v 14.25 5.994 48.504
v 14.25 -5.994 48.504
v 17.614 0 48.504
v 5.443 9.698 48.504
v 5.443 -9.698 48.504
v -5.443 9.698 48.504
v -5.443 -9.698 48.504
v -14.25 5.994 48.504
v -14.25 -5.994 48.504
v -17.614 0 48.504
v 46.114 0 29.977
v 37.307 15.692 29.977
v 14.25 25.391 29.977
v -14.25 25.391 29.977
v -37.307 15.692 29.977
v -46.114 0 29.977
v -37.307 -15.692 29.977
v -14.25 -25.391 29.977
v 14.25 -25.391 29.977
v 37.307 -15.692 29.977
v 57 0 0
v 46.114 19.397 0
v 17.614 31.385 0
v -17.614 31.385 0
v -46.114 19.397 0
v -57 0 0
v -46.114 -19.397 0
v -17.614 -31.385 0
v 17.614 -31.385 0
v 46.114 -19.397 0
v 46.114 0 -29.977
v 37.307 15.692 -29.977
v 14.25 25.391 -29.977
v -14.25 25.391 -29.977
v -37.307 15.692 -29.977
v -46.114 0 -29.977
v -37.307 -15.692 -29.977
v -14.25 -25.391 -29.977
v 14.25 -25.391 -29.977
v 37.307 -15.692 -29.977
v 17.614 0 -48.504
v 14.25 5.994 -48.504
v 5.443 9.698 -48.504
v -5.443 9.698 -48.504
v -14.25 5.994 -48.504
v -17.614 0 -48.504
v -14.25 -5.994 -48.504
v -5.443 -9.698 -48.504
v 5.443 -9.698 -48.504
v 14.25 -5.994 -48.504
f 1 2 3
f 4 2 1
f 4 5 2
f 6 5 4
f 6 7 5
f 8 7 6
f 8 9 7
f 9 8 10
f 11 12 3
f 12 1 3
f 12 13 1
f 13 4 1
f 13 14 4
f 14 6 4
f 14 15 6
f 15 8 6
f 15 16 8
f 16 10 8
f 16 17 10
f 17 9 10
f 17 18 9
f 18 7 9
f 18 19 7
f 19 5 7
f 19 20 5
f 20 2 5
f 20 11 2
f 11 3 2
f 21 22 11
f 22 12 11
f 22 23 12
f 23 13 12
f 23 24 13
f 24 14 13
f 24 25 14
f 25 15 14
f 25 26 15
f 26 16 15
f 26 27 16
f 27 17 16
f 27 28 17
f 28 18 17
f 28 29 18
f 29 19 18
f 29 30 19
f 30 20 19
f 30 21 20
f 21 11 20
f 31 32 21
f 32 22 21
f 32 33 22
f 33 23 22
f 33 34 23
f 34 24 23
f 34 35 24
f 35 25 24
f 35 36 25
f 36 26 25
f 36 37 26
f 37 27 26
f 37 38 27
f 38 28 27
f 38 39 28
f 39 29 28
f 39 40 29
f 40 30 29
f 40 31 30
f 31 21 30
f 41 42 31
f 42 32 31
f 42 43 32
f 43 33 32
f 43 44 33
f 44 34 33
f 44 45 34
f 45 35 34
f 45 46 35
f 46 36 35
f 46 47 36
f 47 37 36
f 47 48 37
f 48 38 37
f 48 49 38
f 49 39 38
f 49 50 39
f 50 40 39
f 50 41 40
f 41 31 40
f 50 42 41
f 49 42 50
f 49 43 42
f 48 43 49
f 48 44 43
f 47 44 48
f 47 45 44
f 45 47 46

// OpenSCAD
// Generated by SolidPython 1.0.1 on 2020-07-29 00:46:54


scale(v = [19, 11, 17]) {
	sphere(r = 3);
}
/***********************************************
*********      SolidPython code:      **********
************************************************
 
# import packages: SolidPython
from solid import *
from solid.utils import *
from itertools import chain, combinations, permutations


class Resize:

    def __init__(self, scad_file):
        self.scad_file = scad_file
        #self.scad_file = import_scad(scad_file)
        # cone/cylinder param:
        self.r1 = 0
        self.r2 = 0
        self.h = 0
        # rectangular prism param:
        self.w = 0
        self.l = 0
        # ellipse param:
        self.r = 0

    # import OpenScad code (file name corresponds to shape)


    # classify shape + parameters
    def assign(self, param1, param2, param3):
        if self.scad_file == 'cone.scad':
            self.r1 = param1
            self.r2 = param2
            self.h = param3
        elif self.scad_file == 'cylinder.scad':
            self.r1 = param1
            self.r2 = param2
            self.h = param3
        elif self.scad_file == 'rectangularPrism.scad':
            self.h = param1
            self.l = param2
            self.w = param3
        else:
            self.r = param1
            self.h = param2

    # resize parameters
    def iterate(self):
        x = range(3, 20, 2)
        i = 1
        if self.scad_file == 'cone.scad':
            tempList = list(permutations(x, 2))
            for temp in tempList:
                param1 = temp[0]
                param2 = temp[1]
                filepath = 'produced_scad_files/' + 'cone' + str(param1) + '_' + str(param2) + '_' + '.scad'
                scad_render_to_file(cylinder(h=param1, r1=param2, r2=0), filepath)

        elif self.scad_file == 'cylinder.scad':
            tempList = list(permutations(x, 3))
            for temp in tempList:
                param1 = temp[0]
                param2 = temp[1]
                filepath = 'produced_scad_files/' + 'cylinder' + str(param1) + '_' + str(param2) + '_' + '.scad'
                scad_render_to_file(cylinder(h=param1, r1=param2, r2=param2), filepath)

        elif self.scad_file == 'rectangularPrism.scad':
            tempList = list(permutations(x, 3))
            for temp in tempList:
                param1 = temp[0]
                param2 = temp[1]
                param3 = temp[2]
                filepath = 'produced_scad_files/' + 'rectangularPrism' + str(param1) + '_' + str(param2) + '_' + str(
                    param3) + '.scad'
                scad_render_to_file(cube(size=(param1, param2, param3)), filepath)

        elif self.scad_file == 'ellipse.scad':
            tempList = list(permutations(x, 4))
            for temp in tempList:
                param1 = temp[0]
                param2 = temp[1]
                param3 = temp[2]
                param4 = temp[3]
                filepath = 'produced_scad_files/' + 'ellipse' + str(param1) + '_' + str(param2) + '_' + str(param3) + '_' + str(param4) + '.scad'
                scad_render_to_file(scale([param1, param2, param3])(sphere(r=param4)), filepath)

    def render_to_scadfile(self):
        scad_render_to_file(scad, 'example.scad') 
 
************************************************/
